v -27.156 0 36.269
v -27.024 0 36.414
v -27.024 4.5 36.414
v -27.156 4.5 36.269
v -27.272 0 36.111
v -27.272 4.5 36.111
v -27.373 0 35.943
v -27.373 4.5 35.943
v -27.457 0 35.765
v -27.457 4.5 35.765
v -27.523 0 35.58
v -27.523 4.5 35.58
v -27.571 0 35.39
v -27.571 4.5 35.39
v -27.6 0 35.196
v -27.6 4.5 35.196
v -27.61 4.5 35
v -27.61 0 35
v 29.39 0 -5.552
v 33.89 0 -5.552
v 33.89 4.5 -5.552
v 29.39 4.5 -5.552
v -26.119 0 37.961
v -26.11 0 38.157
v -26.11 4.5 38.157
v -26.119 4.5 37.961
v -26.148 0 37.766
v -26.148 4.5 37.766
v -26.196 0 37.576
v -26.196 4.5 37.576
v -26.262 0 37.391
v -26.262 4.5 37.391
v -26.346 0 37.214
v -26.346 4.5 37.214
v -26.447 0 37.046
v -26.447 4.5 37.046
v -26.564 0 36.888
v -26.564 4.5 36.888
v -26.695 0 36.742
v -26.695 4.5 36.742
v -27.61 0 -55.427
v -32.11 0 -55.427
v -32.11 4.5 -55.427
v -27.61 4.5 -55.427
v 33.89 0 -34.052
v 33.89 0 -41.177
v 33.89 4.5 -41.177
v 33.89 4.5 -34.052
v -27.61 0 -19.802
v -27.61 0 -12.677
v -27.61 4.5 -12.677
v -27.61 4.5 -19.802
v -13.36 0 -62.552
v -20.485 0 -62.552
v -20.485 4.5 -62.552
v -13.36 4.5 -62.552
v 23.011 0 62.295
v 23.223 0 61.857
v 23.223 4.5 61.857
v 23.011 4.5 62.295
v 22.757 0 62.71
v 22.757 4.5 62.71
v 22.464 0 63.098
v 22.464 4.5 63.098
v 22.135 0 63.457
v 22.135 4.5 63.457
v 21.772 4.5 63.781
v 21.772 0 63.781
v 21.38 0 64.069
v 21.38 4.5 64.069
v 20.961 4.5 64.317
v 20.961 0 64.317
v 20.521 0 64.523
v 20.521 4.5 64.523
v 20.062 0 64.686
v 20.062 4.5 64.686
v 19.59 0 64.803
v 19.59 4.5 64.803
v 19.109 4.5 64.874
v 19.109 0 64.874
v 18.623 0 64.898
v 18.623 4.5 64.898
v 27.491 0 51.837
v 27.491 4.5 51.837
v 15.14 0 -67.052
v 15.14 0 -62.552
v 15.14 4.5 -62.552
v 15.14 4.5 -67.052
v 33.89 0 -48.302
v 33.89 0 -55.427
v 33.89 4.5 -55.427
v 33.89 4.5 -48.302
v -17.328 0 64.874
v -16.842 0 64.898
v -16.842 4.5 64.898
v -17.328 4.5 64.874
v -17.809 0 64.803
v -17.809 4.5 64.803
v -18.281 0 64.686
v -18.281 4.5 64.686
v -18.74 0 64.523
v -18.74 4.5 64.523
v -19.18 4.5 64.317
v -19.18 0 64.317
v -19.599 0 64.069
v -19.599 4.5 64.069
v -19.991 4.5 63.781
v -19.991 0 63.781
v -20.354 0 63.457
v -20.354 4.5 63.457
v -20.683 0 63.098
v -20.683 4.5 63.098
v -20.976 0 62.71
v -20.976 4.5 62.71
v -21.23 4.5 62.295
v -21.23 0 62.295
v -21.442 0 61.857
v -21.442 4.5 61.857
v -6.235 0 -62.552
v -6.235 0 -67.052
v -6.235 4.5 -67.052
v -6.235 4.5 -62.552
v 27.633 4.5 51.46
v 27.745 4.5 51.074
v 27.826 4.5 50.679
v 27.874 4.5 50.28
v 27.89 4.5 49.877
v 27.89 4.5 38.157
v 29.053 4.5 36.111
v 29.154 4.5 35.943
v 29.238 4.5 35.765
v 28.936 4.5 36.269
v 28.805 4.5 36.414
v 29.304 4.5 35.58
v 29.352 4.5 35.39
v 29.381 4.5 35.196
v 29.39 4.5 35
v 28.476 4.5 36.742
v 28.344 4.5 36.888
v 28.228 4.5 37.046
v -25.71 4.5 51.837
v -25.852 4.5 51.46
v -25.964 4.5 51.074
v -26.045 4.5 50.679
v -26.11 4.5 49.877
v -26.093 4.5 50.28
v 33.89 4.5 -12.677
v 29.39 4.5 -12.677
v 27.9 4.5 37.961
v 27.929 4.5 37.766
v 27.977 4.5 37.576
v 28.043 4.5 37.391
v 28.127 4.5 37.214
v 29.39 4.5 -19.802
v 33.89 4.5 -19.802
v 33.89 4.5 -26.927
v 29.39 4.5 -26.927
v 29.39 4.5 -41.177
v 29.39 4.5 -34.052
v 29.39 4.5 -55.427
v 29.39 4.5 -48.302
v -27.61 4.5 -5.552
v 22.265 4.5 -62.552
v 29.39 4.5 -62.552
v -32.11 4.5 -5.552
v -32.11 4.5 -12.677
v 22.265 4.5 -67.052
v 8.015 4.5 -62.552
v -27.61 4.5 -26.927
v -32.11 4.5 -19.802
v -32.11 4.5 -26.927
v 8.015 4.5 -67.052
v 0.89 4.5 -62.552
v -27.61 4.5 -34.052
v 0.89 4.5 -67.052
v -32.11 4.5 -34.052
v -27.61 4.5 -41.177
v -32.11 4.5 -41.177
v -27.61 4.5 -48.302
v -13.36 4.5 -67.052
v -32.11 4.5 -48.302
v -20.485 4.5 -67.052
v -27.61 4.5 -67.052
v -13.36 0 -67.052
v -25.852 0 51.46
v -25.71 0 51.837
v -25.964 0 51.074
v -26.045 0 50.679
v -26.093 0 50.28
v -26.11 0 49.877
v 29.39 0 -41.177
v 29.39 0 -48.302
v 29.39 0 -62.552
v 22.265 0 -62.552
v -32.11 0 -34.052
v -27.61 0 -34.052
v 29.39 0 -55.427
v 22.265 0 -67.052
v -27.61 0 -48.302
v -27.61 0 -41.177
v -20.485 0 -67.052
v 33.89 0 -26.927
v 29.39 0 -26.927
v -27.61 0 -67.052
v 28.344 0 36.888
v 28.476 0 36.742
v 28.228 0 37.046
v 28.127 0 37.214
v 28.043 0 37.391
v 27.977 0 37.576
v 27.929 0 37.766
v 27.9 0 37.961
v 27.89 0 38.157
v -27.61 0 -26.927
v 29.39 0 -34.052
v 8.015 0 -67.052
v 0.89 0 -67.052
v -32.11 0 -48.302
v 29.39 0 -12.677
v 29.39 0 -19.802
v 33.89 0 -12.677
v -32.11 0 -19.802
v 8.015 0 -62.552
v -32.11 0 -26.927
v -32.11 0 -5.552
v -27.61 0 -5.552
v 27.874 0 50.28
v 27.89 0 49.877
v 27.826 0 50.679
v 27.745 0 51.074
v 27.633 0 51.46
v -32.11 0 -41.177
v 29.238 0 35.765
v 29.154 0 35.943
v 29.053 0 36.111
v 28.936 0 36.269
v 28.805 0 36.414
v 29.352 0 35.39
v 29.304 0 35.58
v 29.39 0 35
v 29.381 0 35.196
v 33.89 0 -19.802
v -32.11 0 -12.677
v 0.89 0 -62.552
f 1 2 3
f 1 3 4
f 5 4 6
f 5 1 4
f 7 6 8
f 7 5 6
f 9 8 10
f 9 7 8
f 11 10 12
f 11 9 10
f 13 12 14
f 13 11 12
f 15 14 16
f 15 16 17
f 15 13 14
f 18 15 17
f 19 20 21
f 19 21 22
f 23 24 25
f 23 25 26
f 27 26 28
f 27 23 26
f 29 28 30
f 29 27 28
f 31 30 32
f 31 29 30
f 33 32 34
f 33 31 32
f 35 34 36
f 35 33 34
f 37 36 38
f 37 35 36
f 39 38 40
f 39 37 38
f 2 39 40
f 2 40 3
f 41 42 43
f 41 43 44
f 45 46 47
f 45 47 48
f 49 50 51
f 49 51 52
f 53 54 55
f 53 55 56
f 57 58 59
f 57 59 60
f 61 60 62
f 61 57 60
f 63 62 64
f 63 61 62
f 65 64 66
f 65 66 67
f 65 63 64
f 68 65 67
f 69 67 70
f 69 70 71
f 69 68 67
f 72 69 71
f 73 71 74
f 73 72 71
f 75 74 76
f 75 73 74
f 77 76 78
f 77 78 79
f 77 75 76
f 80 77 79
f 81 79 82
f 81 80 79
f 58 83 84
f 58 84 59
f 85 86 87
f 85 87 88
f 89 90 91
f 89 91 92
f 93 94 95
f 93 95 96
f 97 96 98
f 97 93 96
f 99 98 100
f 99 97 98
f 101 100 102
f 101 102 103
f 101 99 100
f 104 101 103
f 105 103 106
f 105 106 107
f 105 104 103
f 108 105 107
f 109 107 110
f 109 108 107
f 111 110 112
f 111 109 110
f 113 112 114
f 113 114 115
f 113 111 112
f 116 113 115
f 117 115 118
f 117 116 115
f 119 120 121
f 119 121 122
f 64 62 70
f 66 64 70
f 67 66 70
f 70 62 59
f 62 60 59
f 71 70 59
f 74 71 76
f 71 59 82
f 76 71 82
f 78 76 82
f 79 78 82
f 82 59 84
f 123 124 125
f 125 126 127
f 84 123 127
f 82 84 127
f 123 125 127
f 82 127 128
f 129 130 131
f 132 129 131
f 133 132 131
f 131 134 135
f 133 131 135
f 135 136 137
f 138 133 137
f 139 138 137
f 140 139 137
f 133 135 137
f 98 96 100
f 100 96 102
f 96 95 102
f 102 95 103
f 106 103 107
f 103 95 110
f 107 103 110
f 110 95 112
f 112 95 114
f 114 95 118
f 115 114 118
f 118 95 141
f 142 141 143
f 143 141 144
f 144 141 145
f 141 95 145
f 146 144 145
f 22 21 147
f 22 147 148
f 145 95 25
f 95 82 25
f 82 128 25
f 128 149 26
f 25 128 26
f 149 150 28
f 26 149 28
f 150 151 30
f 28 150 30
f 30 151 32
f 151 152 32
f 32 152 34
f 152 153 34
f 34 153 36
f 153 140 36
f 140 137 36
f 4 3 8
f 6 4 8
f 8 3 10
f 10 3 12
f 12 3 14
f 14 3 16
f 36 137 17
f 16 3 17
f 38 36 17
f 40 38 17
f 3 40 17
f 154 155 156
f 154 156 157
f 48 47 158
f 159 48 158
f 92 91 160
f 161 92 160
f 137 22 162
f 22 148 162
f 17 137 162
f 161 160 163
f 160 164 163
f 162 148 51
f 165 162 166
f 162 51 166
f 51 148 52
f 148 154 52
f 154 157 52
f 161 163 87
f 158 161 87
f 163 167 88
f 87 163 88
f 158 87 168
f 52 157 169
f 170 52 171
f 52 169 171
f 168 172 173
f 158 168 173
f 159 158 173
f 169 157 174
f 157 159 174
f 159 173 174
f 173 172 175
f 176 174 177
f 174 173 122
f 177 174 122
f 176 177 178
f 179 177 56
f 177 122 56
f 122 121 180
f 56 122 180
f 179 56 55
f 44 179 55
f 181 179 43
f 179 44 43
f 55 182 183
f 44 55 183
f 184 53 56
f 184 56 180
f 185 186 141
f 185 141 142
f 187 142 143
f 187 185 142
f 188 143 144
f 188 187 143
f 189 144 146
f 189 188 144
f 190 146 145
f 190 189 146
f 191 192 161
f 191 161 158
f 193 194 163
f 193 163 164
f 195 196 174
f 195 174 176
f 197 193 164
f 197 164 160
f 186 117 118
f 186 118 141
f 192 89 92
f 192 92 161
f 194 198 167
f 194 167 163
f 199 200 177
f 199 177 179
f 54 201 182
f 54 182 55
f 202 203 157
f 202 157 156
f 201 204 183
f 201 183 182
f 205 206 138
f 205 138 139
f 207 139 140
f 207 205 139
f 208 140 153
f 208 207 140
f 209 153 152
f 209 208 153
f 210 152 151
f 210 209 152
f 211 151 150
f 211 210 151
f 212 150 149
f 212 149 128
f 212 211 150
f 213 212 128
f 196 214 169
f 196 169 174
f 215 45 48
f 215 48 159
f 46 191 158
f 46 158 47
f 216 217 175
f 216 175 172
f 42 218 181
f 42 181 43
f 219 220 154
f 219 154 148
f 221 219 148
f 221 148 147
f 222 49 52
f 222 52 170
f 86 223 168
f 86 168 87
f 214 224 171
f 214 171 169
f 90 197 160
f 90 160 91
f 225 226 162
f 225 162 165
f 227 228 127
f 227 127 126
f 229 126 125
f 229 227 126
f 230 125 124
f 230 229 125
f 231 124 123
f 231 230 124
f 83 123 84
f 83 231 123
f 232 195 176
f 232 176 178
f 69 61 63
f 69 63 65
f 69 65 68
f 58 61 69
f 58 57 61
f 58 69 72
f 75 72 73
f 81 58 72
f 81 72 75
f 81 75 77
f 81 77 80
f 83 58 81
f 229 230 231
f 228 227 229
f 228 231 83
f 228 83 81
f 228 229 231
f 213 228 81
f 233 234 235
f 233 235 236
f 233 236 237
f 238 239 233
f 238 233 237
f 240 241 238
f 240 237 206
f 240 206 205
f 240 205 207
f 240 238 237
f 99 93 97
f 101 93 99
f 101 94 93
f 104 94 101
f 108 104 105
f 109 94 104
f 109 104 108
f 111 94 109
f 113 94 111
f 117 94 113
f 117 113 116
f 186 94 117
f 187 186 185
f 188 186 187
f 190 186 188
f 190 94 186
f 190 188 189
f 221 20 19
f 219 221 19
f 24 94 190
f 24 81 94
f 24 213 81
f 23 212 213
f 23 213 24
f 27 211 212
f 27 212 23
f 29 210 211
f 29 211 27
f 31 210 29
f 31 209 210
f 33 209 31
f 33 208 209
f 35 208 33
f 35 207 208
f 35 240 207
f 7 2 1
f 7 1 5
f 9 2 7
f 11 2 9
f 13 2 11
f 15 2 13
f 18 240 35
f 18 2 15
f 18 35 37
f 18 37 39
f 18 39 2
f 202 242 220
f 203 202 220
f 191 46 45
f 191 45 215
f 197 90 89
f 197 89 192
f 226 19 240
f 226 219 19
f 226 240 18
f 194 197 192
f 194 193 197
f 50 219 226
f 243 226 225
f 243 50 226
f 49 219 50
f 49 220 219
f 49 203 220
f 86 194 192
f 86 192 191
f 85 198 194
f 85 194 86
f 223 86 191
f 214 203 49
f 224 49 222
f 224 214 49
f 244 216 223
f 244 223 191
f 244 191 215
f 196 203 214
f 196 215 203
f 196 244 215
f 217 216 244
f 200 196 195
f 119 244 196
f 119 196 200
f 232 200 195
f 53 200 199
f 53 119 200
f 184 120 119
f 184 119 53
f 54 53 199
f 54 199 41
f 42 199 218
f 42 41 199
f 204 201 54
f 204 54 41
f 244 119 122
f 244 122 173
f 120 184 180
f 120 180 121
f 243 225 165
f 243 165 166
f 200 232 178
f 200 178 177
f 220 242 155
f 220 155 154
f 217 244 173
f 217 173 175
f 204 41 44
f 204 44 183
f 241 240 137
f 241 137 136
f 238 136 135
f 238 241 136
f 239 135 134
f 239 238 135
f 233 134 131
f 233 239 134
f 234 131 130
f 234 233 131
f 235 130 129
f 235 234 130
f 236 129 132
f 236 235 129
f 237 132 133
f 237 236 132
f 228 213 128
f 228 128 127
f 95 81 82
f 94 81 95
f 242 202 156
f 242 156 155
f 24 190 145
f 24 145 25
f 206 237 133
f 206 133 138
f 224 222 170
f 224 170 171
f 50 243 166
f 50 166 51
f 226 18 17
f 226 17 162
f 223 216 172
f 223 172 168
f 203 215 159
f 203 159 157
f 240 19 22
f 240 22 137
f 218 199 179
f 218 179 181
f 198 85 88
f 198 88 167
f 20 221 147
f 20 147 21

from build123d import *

# Parameters (mm, degrees)
EXTRUDE_1_DEPTH = 4.5


with BuildPart() as part:
    # 草图1 → 凸台-拉伸1 (new body)
    with BuildSketch(Plane(origin=(0, 0, 0), x_dir=(1, 0, 0), z_dir=(0, 1, 0))):
        with BuildLine():
            Line((-6.23452468, 62.552230204), (0.89047532, 62.552230204))
            Line((0.89047532, 62.552230204), (0.89047532, 67.052230204))
            Line((0.89047532, 67.052230204), (8.01547532, 67.052230204))
            Line((8.01547532, 67.052230204), (8.01547532, 62.552230204))
            Line((8.01547532, 62.552230204), (15.14047532, 62.552230204))
            Line((15.14047532, 62.552230204), (15.14047532, 67.052230204))
            Line((15.14047532, 67.052230204), (22.26547532, 67.052230204))
            Line((22.26547532, 67.052230204), (22.26547532, 62.552230204))
            Line((22.26547532, 62.552230204), (29.39047532, 62.552230204))
            Line((29.39047532, 62.552230204), (29.39047532, 55.427230204))
            Line((29.39047532, 55.427230204), (33.89047532, 55.427230204))
            Line((33.89047532, 55.427230204), (33.89047532, 48.302230204))
            Line((33.89047532, 48.302230204), (29.39047532, 48.302230204))
            Line((29.39047532, 48.302230204), (29.39047532, 41.177230204))
            Line((29.39047532, 41.177230204), (33.89047532, 41.177230204))
            Line((33.89047532, 41.177230204), (33.89047532, 34.052230204))
            Line((33.89047532, 34.052230204), (29.39047532, 34.052230204))
            Line((29.39047532, 34.052230204), (29.39047532, 26.927230204))
            Line((29.39047532, 26.927230204), (33.89047532, 26.927230204))
            Line((33.89047532, 26.927230204), (33.89047532, 19.802230204))
            Line((33.89047532, 19.802230204), (29.39047532, 19.802230204))
            Line((29.39047532, 19.802230204), (29.39047532, 12.677230204))
            Line((29.39047532, 12.677230204), (33.89047532, 12.677230204))
            Line((33.89047532, 12.677230204), (33.89047532, 5.552230204))
            Line((33.89047532, 5.552230204), (29.39047532, 5.552230204))
            Line((29.39047532, 5.552230204), (29.39047532, -34.999800679))
            ThreePointArc((29.39047532, -34.999800679), (29.238234385, -35.765167544), (28.804688882, -36.414014242))
            Line((28.804688882, -36.414014242), (28.476261758, -36.742441366))
            ThreePointArc((28.476261758, -36.742441366), (28.042716255, -37.391288064), (27.89047532, -38.156654929))
            Line((27.89047532, -38.156654929), (27.89047532, -49.877331374))
            ThreePointArc((27.89047532, -49.877331374), (27.789489805, -50.877159896), (27.49061249, -51.83660114))
            Line((27.49061249, -51.83660114), (23.222752356, -61.857039562))
            ThreePointArc((23.222752356, -61.857039562), (21.379756021, -64.068881688), (18.622615186, -64.897769796))
            Line((18.622615186, -64.897769796), (-16.841664546, -64.897769796))
            ThreePointArc((-16.841664546, -64.897769796), (-19.598805381, -64.068881688), (-21.441801716, -61.857039562))
            Line((-21.441801716, -61.857039562), (-25.70966185, -51.83660114))
            ThreePointArc((-25.70966185, -51.83660114), (-26.008539165, -50.877159896), (-26.10952468, -49.877331374))
            Line((-26.10952468, -49.877331374), (-26.10952468, -38.156654929))
            ThreePointArc((-26.10952468, -38.156654929), (-26.261765615, -37.391288064), (-26.695311118, -36.742441366))
            Line((-26.695311118, -36.742441366), (-27.023738242, -36.414014242))
            ThreePointArc((-27.023738242, -36.414014242), (-27.457283745, -35.765167544), (-27.60952468, -34.999800679))
            Line((-27.60952468, -34.999800679), (-27.60952468, 5.552230204))
            Line((-27.60952468, 5.552230204), (-32.10952468, 5.552230204))
            Line((-32.10952468, 5.552230204), (-32.10952468, 12.677230204))
            Line((-32.10952468, 12.677230204), (-27.60952468, 12.677230204))
            Line((-27.60952468, 12.677230204), (-27.60952468, 19.802230204))
            Line((-27.60952468, 19.802230204), (-32.10952468, 19.802230204))
            Line((-32.10952468, 19.802230204), (-32.10952468, 26.927230204))
            Line((-32.10952468, 26.927230204), (-27.60952468, 26.927230204))
            Line((-27.60952468, 26.927230204), (-27.60952468, 34.052230204))
            Line((-27.60952468, 34.052230204), (-32.10952468, 34.052230204))
            Line((-32.10952468, 34.052230204), (-32.10952468, 41.177230204))
            Line((-32.10952468, 41.177230204), (-27.60952468, 41.177230204))
            Line((-27.60952468, 41.177230204), (-27.60952468, 48.302230204))
            Line((-27.60952468, 48.302230204), (-32.10952468, 48.302230204))
            Line((-32.10952468, 48.302230204), (-32.10952468, 55.427230204))
            Line((-32.10952468, 55.427230204), (-27.60952468, 55.427230204))
            Line((-27.60952468, 55.427230204), (-27.60952468, 67.052230204))
            Line((-27.60952468, 67.052230204), (-20.48452468, 67.052230204))
            Line((-20.48452468, 67.052230204), (-20.48452468, 62.552230204))
            Line((-20.48452468, 62.552230204), (-13.35952468, 62.552230204))
            Line((-13.35952468, 62.552230204), (-13.35952468, 67.052230204))
            Line((-13.35952468, 67.052230204), (-6.23452468, 67.052230204))
            Line((-6.23452468, 67.052230204), (-6.23452468, 62.552230204))
        make_face()
    extrude(amount=EXTRUDE_1_DEPTH)


solid = part.part
